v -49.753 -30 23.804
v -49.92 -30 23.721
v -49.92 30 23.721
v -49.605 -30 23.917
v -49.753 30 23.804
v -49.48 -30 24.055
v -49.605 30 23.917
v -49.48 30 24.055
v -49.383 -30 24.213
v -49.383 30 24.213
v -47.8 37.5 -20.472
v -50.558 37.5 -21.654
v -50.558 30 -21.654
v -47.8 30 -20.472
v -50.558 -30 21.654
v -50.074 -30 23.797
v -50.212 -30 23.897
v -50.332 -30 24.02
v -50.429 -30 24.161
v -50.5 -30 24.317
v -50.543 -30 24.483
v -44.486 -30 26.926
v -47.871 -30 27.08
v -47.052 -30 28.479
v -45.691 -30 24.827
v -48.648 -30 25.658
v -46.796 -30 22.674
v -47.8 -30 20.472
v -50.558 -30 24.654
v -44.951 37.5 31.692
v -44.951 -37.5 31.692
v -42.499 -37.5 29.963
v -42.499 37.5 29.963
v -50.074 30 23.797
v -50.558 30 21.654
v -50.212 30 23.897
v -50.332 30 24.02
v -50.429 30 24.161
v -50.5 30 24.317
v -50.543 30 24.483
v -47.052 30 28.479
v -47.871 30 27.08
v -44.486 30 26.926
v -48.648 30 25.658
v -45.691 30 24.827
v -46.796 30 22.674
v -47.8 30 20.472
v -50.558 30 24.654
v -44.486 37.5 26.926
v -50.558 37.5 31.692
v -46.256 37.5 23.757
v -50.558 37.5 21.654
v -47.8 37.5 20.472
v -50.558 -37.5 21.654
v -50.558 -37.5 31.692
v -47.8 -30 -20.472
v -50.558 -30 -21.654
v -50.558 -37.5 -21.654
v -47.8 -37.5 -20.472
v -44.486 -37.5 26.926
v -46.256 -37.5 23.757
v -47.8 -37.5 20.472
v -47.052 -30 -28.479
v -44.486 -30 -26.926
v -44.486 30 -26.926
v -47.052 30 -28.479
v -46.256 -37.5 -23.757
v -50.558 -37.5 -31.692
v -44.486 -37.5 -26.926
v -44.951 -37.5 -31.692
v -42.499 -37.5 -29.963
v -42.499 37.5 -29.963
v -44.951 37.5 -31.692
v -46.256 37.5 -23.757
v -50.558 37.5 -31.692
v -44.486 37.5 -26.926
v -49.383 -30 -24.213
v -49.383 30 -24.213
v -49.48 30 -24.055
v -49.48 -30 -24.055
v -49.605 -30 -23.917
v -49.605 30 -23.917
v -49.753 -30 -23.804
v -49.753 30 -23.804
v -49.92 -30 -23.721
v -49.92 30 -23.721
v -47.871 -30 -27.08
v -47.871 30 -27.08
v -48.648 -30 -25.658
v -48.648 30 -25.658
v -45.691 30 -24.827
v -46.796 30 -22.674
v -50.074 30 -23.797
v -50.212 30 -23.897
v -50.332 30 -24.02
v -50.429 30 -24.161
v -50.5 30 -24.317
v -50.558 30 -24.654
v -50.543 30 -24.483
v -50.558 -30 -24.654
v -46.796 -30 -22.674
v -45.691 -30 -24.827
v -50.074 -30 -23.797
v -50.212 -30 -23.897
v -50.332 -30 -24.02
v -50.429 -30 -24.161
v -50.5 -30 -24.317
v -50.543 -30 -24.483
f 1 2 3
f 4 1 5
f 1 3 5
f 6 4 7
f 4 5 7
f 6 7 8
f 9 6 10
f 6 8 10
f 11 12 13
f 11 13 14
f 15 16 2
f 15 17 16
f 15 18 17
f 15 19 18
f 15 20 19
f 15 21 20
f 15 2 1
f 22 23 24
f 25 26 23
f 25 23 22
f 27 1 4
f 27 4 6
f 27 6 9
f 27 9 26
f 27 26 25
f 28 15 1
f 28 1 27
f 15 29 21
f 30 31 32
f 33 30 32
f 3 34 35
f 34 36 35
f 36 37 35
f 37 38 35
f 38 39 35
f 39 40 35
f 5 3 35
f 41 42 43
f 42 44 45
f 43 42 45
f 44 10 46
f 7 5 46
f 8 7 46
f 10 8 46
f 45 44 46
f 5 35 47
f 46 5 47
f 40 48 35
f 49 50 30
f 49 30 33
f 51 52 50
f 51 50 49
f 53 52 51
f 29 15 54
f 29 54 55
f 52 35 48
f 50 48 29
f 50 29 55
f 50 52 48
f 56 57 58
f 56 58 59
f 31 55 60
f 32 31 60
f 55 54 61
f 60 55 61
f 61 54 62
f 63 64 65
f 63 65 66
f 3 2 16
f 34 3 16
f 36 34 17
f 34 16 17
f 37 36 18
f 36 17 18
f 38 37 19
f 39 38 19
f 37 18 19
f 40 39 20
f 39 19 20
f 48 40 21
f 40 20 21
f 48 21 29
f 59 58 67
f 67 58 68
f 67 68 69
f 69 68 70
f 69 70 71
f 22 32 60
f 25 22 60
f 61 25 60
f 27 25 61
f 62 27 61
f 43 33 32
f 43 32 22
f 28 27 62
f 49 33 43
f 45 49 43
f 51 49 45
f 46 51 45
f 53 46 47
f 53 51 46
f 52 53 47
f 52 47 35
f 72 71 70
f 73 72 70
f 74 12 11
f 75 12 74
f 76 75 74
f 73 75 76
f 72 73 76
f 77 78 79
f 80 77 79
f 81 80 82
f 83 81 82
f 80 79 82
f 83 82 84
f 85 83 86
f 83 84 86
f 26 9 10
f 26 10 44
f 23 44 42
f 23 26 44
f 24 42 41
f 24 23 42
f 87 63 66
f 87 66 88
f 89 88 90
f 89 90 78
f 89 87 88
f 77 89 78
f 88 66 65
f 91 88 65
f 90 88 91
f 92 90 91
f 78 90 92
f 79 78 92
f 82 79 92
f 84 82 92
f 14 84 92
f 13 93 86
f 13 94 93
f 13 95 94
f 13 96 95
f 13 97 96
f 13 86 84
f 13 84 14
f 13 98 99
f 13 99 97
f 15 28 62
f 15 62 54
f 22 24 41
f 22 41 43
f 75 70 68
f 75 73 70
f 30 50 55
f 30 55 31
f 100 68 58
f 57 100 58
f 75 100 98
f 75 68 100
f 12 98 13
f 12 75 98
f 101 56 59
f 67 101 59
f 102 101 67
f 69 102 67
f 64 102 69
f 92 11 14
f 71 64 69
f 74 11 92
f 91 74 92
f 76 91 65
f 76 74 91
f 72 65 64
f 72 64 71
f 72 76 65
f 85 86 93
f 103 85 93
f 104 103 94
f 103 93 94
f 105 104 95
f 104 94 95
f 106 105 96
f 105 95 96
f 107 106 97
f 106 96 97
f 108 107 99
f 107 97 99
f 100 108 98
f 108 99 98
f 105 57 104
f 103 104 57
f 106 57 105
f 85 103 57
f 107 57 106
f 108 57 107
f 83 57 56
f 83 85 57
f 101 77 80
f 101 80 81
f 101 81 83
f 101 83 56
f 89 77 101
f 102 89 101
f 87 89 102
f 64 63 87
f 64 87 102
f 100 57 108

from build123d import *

# Parameters (mm, degrees)
BOSS_EXTRUDE1_DEPTH   = 37.5
BOSS_EXTRUDE1_2_DEPTH = 37.5
CUT_EXTRUDE1_START    = -30
CUT_EXTRUDE1_DEPTH    = 60
SKETCH2_W             = 47.307139372
SKETCH2_H             = 60
CUT_EXTRUDE2_DEPTH    = 10
FILLET1_R             = 1
FILLET2_R             = 1


# Read off the part's stored shape, not the designer's step: Cut-Extrude1
with BuildPart() as part:
    # Sketch1 → Boss-Extrude1 (new, symmetric)
    with BuildSketch(Plane(origin=(0, 0, 0), x_dir=(1, 0, 0), z_dir=(0, 1, 0))):
        with BuildLine():
            Line((-50.558114283, 21.653569686), (-47.800398958, 20.472465885))
            ThreePointArc((-47.800398958, 20.472465885), (-45.398587973, 25.356817822), (-42.499380558, 29.963355156))
            Line((-42.499380558, 29.963355156), (-44.951267898, 31.692010261))
            Line((-44.951267898, 31.692010261), (-50.558114283, 31.692010261))
            Line((-50.558114283, 31.692010261), (-50.558114283, 21.653569686))
        make_face()
    extrude(amount=BOSS_EXTRUDE1_DEPTH, both=True)


with BuildPart() as body_2:
    # Sketch1 → Boss-Extrude1 2 (new, symmetric)
    with BuildSketch(Plane(origin=(0, 0, 0), x_dir=(1, 0, 0), z_dir=(0, 1, 0))):
        with BuildLine():
            Line((-47.800398958, -20.472465885), (-50.558114283, -21.653569686))
            Line((-50.558114283, -21.653569686), (-50.558114283, -31.692010261))
            Line((-50.558114283, -31.692010261), (-44.951267898, -31.692010261))
            Line((-44.951267898, -31.692010261), (-42.499380558, -29.963355156))
            ThreePointArc((-42.499380558, -29.963355156), (-45.398587973, -25.356817822), (-47.800398958, -20.472465885))
        make_face()
    extrude(amount=BOSS_EXTRUDE1_2_DEPTH, both=True)


with BuildPart() as cut_extrude1_tool:
    # Cut-Extrude1 outline → Cut-Extrude1 (new body)
    with BuildSketch(Plane(origin=(0, 0, 0), x_dir=(1, 0, 0), z_dir=(0, 1, 0)).offset(CUT_EXTRUDE1_START)):
        with BuildLine():
            Line((-44.4859922, 26.925759005), (-47.05249175, 28.479168178))
            ThreePointArc((-47.05249175, 28.479168178), (-48.924480592, 25.12757845), (-50.558114283, 21.653569686))
            Line((-50.558114283, 21.653569686), (-47.800398958, 20.472465885))
            ThreePointArc((-47.800398958, 20.472465885), (-46.25587256, 23.756983262), (-44.4859922, 26.925759005))
        make_face()
        with BuildLine():
            Line((-47.800398958, -20.472465885), (-50.558114283, -21.653569686))
            ThreePointArc((-50.558114283, -21.653569686), (-48.924480592, -25.12757845), (-47.05249175, -28.479168178))
            Line((-47.05249175, -28.479168178), (-44.4859922, -26.925759005))
            ThreePointArc((-44.4859922, -26.925759005), (-46.25587256, -23.756983262), (-47.800398958, -20.472465885))
        make_face()
    extrude(amount=CUT_EXTRUDE1_DEPTH)


with BuildPart() as part_1:
    add(part.part)

    # Cut-Extrude1: cut by cut_extrude1_tool
    add(cut_extrude1_tool.part, mode=Mode.SUBTRACT)


with BuildPart() as body_2_1:
    add(body_2.part)

    # Cut-Extrude1: cut by cut_extrude1_tool
    add(cut_extrude1_tool.part, mode=Mode.SUBTRACT)


with BuildPart() as cut_extrude2_tool:
    # Sketch2 → Cut-Extrude2 (new body)
    with BuildSketch(Plane.ZY.offset(50.558114283)):
        Rectangle(SKETCH2_W, SKETCH2_H)
    extrude(amount=-CUT_EXTRUDE2_DEPTH)


with BuildPart() as part_2:
    add(part_1.part)

    # Cut-Extrude2: cut by cut_extrude2_tool
    add(cut_extrude2_tool.part, mode=Mode.SUBTRACT)

    # Fillet1
    # the kernel refuses this fillet: 1 mm, written as the material it takes off along each edge
    with BuildSketch(Plane(origin=(-49.653888479, 30, -23.653569686), x_dir=(-1, 0, 0), z_dir=(0, -1, 0))) as fillet1_piece_1:
        with BuildLine():
            CenterArc((0.627335668, 1), FILLET1_R, 206.119342863, 63.880657137)
            ThreePointArc((-0.270543335, 0.559757684), (-0.134480737, 0.280261116), (0, 0))
            Line((0, 0), (0.627335668, 0))
        make_face()
    extrude(amount=60, mode=Mode.SUBTRACT)
    with BuildSketch(Plane(origin=(-50.558114283, 30, -23.653569686), x_dir=(1, 0, 0), z_dir=(0, -1, 0))) as fillet1_piece_2:
        with BuildLine():
            CenterArc((FILLET1_R, -FILLET1_R), FILLET1_R, 90, 90)
            Line((0, -FILLET1_R), (0, 0))
            Line((0, 0), (FILLET1_R, 0))
        make_face()
    extrude(amount=60, mode=Mode.SUBTRACT)


with BuildPart() as body_2_2:
    add(body_2_1.part)

    # Cut-Extrude2: cut by cut_extrude2_tool
    add(cut_extrude2_tool.part, mode=Mode.SUBTRACT)

    # Fillet2
    # the kernel refuses this fillet: 1 mm, written as the material it takes off along each edge
    with BuildSketch(Plane(origin=(-50.558114283, -30, 23.653569686), x_dir=(0, 0, 1), z_dir=(0, 1, 0))) as fillet2_piece_1:
        with BuildLine():
            CenterArc((FILLET2_R, FILLET2_R), FILLET2_R, 180, 90)
            Line((0, FILLET2_R), (0, 0))
            Line((0, 0), (FILLET2_R, 0))
        make_face()
    extrude(amount=60, mode=Mode.SUBTRACT)
    with BuildSketch(Plane(origin=(-49.653888479, 30, 23.653569686), x_dir=(-1, 0, 0), z_dir=(0, -1, 0))) as fillet2_piece_2:
        with BuildLine():
            CenterArc((0.627335668, -1), FILLET2_R, 90, 63.880657137)
            ThreePointArc((-0.270543335, -0.559757684), (-0.134480737, -0.280261116), (0, 0))
            Line((0, 0), (0.627335668, 0))
        make_face()
    extrude(amount=60, mode=Mode.SUBTRACT)


solid = Compound([part_2.part, body_2_2.part])
